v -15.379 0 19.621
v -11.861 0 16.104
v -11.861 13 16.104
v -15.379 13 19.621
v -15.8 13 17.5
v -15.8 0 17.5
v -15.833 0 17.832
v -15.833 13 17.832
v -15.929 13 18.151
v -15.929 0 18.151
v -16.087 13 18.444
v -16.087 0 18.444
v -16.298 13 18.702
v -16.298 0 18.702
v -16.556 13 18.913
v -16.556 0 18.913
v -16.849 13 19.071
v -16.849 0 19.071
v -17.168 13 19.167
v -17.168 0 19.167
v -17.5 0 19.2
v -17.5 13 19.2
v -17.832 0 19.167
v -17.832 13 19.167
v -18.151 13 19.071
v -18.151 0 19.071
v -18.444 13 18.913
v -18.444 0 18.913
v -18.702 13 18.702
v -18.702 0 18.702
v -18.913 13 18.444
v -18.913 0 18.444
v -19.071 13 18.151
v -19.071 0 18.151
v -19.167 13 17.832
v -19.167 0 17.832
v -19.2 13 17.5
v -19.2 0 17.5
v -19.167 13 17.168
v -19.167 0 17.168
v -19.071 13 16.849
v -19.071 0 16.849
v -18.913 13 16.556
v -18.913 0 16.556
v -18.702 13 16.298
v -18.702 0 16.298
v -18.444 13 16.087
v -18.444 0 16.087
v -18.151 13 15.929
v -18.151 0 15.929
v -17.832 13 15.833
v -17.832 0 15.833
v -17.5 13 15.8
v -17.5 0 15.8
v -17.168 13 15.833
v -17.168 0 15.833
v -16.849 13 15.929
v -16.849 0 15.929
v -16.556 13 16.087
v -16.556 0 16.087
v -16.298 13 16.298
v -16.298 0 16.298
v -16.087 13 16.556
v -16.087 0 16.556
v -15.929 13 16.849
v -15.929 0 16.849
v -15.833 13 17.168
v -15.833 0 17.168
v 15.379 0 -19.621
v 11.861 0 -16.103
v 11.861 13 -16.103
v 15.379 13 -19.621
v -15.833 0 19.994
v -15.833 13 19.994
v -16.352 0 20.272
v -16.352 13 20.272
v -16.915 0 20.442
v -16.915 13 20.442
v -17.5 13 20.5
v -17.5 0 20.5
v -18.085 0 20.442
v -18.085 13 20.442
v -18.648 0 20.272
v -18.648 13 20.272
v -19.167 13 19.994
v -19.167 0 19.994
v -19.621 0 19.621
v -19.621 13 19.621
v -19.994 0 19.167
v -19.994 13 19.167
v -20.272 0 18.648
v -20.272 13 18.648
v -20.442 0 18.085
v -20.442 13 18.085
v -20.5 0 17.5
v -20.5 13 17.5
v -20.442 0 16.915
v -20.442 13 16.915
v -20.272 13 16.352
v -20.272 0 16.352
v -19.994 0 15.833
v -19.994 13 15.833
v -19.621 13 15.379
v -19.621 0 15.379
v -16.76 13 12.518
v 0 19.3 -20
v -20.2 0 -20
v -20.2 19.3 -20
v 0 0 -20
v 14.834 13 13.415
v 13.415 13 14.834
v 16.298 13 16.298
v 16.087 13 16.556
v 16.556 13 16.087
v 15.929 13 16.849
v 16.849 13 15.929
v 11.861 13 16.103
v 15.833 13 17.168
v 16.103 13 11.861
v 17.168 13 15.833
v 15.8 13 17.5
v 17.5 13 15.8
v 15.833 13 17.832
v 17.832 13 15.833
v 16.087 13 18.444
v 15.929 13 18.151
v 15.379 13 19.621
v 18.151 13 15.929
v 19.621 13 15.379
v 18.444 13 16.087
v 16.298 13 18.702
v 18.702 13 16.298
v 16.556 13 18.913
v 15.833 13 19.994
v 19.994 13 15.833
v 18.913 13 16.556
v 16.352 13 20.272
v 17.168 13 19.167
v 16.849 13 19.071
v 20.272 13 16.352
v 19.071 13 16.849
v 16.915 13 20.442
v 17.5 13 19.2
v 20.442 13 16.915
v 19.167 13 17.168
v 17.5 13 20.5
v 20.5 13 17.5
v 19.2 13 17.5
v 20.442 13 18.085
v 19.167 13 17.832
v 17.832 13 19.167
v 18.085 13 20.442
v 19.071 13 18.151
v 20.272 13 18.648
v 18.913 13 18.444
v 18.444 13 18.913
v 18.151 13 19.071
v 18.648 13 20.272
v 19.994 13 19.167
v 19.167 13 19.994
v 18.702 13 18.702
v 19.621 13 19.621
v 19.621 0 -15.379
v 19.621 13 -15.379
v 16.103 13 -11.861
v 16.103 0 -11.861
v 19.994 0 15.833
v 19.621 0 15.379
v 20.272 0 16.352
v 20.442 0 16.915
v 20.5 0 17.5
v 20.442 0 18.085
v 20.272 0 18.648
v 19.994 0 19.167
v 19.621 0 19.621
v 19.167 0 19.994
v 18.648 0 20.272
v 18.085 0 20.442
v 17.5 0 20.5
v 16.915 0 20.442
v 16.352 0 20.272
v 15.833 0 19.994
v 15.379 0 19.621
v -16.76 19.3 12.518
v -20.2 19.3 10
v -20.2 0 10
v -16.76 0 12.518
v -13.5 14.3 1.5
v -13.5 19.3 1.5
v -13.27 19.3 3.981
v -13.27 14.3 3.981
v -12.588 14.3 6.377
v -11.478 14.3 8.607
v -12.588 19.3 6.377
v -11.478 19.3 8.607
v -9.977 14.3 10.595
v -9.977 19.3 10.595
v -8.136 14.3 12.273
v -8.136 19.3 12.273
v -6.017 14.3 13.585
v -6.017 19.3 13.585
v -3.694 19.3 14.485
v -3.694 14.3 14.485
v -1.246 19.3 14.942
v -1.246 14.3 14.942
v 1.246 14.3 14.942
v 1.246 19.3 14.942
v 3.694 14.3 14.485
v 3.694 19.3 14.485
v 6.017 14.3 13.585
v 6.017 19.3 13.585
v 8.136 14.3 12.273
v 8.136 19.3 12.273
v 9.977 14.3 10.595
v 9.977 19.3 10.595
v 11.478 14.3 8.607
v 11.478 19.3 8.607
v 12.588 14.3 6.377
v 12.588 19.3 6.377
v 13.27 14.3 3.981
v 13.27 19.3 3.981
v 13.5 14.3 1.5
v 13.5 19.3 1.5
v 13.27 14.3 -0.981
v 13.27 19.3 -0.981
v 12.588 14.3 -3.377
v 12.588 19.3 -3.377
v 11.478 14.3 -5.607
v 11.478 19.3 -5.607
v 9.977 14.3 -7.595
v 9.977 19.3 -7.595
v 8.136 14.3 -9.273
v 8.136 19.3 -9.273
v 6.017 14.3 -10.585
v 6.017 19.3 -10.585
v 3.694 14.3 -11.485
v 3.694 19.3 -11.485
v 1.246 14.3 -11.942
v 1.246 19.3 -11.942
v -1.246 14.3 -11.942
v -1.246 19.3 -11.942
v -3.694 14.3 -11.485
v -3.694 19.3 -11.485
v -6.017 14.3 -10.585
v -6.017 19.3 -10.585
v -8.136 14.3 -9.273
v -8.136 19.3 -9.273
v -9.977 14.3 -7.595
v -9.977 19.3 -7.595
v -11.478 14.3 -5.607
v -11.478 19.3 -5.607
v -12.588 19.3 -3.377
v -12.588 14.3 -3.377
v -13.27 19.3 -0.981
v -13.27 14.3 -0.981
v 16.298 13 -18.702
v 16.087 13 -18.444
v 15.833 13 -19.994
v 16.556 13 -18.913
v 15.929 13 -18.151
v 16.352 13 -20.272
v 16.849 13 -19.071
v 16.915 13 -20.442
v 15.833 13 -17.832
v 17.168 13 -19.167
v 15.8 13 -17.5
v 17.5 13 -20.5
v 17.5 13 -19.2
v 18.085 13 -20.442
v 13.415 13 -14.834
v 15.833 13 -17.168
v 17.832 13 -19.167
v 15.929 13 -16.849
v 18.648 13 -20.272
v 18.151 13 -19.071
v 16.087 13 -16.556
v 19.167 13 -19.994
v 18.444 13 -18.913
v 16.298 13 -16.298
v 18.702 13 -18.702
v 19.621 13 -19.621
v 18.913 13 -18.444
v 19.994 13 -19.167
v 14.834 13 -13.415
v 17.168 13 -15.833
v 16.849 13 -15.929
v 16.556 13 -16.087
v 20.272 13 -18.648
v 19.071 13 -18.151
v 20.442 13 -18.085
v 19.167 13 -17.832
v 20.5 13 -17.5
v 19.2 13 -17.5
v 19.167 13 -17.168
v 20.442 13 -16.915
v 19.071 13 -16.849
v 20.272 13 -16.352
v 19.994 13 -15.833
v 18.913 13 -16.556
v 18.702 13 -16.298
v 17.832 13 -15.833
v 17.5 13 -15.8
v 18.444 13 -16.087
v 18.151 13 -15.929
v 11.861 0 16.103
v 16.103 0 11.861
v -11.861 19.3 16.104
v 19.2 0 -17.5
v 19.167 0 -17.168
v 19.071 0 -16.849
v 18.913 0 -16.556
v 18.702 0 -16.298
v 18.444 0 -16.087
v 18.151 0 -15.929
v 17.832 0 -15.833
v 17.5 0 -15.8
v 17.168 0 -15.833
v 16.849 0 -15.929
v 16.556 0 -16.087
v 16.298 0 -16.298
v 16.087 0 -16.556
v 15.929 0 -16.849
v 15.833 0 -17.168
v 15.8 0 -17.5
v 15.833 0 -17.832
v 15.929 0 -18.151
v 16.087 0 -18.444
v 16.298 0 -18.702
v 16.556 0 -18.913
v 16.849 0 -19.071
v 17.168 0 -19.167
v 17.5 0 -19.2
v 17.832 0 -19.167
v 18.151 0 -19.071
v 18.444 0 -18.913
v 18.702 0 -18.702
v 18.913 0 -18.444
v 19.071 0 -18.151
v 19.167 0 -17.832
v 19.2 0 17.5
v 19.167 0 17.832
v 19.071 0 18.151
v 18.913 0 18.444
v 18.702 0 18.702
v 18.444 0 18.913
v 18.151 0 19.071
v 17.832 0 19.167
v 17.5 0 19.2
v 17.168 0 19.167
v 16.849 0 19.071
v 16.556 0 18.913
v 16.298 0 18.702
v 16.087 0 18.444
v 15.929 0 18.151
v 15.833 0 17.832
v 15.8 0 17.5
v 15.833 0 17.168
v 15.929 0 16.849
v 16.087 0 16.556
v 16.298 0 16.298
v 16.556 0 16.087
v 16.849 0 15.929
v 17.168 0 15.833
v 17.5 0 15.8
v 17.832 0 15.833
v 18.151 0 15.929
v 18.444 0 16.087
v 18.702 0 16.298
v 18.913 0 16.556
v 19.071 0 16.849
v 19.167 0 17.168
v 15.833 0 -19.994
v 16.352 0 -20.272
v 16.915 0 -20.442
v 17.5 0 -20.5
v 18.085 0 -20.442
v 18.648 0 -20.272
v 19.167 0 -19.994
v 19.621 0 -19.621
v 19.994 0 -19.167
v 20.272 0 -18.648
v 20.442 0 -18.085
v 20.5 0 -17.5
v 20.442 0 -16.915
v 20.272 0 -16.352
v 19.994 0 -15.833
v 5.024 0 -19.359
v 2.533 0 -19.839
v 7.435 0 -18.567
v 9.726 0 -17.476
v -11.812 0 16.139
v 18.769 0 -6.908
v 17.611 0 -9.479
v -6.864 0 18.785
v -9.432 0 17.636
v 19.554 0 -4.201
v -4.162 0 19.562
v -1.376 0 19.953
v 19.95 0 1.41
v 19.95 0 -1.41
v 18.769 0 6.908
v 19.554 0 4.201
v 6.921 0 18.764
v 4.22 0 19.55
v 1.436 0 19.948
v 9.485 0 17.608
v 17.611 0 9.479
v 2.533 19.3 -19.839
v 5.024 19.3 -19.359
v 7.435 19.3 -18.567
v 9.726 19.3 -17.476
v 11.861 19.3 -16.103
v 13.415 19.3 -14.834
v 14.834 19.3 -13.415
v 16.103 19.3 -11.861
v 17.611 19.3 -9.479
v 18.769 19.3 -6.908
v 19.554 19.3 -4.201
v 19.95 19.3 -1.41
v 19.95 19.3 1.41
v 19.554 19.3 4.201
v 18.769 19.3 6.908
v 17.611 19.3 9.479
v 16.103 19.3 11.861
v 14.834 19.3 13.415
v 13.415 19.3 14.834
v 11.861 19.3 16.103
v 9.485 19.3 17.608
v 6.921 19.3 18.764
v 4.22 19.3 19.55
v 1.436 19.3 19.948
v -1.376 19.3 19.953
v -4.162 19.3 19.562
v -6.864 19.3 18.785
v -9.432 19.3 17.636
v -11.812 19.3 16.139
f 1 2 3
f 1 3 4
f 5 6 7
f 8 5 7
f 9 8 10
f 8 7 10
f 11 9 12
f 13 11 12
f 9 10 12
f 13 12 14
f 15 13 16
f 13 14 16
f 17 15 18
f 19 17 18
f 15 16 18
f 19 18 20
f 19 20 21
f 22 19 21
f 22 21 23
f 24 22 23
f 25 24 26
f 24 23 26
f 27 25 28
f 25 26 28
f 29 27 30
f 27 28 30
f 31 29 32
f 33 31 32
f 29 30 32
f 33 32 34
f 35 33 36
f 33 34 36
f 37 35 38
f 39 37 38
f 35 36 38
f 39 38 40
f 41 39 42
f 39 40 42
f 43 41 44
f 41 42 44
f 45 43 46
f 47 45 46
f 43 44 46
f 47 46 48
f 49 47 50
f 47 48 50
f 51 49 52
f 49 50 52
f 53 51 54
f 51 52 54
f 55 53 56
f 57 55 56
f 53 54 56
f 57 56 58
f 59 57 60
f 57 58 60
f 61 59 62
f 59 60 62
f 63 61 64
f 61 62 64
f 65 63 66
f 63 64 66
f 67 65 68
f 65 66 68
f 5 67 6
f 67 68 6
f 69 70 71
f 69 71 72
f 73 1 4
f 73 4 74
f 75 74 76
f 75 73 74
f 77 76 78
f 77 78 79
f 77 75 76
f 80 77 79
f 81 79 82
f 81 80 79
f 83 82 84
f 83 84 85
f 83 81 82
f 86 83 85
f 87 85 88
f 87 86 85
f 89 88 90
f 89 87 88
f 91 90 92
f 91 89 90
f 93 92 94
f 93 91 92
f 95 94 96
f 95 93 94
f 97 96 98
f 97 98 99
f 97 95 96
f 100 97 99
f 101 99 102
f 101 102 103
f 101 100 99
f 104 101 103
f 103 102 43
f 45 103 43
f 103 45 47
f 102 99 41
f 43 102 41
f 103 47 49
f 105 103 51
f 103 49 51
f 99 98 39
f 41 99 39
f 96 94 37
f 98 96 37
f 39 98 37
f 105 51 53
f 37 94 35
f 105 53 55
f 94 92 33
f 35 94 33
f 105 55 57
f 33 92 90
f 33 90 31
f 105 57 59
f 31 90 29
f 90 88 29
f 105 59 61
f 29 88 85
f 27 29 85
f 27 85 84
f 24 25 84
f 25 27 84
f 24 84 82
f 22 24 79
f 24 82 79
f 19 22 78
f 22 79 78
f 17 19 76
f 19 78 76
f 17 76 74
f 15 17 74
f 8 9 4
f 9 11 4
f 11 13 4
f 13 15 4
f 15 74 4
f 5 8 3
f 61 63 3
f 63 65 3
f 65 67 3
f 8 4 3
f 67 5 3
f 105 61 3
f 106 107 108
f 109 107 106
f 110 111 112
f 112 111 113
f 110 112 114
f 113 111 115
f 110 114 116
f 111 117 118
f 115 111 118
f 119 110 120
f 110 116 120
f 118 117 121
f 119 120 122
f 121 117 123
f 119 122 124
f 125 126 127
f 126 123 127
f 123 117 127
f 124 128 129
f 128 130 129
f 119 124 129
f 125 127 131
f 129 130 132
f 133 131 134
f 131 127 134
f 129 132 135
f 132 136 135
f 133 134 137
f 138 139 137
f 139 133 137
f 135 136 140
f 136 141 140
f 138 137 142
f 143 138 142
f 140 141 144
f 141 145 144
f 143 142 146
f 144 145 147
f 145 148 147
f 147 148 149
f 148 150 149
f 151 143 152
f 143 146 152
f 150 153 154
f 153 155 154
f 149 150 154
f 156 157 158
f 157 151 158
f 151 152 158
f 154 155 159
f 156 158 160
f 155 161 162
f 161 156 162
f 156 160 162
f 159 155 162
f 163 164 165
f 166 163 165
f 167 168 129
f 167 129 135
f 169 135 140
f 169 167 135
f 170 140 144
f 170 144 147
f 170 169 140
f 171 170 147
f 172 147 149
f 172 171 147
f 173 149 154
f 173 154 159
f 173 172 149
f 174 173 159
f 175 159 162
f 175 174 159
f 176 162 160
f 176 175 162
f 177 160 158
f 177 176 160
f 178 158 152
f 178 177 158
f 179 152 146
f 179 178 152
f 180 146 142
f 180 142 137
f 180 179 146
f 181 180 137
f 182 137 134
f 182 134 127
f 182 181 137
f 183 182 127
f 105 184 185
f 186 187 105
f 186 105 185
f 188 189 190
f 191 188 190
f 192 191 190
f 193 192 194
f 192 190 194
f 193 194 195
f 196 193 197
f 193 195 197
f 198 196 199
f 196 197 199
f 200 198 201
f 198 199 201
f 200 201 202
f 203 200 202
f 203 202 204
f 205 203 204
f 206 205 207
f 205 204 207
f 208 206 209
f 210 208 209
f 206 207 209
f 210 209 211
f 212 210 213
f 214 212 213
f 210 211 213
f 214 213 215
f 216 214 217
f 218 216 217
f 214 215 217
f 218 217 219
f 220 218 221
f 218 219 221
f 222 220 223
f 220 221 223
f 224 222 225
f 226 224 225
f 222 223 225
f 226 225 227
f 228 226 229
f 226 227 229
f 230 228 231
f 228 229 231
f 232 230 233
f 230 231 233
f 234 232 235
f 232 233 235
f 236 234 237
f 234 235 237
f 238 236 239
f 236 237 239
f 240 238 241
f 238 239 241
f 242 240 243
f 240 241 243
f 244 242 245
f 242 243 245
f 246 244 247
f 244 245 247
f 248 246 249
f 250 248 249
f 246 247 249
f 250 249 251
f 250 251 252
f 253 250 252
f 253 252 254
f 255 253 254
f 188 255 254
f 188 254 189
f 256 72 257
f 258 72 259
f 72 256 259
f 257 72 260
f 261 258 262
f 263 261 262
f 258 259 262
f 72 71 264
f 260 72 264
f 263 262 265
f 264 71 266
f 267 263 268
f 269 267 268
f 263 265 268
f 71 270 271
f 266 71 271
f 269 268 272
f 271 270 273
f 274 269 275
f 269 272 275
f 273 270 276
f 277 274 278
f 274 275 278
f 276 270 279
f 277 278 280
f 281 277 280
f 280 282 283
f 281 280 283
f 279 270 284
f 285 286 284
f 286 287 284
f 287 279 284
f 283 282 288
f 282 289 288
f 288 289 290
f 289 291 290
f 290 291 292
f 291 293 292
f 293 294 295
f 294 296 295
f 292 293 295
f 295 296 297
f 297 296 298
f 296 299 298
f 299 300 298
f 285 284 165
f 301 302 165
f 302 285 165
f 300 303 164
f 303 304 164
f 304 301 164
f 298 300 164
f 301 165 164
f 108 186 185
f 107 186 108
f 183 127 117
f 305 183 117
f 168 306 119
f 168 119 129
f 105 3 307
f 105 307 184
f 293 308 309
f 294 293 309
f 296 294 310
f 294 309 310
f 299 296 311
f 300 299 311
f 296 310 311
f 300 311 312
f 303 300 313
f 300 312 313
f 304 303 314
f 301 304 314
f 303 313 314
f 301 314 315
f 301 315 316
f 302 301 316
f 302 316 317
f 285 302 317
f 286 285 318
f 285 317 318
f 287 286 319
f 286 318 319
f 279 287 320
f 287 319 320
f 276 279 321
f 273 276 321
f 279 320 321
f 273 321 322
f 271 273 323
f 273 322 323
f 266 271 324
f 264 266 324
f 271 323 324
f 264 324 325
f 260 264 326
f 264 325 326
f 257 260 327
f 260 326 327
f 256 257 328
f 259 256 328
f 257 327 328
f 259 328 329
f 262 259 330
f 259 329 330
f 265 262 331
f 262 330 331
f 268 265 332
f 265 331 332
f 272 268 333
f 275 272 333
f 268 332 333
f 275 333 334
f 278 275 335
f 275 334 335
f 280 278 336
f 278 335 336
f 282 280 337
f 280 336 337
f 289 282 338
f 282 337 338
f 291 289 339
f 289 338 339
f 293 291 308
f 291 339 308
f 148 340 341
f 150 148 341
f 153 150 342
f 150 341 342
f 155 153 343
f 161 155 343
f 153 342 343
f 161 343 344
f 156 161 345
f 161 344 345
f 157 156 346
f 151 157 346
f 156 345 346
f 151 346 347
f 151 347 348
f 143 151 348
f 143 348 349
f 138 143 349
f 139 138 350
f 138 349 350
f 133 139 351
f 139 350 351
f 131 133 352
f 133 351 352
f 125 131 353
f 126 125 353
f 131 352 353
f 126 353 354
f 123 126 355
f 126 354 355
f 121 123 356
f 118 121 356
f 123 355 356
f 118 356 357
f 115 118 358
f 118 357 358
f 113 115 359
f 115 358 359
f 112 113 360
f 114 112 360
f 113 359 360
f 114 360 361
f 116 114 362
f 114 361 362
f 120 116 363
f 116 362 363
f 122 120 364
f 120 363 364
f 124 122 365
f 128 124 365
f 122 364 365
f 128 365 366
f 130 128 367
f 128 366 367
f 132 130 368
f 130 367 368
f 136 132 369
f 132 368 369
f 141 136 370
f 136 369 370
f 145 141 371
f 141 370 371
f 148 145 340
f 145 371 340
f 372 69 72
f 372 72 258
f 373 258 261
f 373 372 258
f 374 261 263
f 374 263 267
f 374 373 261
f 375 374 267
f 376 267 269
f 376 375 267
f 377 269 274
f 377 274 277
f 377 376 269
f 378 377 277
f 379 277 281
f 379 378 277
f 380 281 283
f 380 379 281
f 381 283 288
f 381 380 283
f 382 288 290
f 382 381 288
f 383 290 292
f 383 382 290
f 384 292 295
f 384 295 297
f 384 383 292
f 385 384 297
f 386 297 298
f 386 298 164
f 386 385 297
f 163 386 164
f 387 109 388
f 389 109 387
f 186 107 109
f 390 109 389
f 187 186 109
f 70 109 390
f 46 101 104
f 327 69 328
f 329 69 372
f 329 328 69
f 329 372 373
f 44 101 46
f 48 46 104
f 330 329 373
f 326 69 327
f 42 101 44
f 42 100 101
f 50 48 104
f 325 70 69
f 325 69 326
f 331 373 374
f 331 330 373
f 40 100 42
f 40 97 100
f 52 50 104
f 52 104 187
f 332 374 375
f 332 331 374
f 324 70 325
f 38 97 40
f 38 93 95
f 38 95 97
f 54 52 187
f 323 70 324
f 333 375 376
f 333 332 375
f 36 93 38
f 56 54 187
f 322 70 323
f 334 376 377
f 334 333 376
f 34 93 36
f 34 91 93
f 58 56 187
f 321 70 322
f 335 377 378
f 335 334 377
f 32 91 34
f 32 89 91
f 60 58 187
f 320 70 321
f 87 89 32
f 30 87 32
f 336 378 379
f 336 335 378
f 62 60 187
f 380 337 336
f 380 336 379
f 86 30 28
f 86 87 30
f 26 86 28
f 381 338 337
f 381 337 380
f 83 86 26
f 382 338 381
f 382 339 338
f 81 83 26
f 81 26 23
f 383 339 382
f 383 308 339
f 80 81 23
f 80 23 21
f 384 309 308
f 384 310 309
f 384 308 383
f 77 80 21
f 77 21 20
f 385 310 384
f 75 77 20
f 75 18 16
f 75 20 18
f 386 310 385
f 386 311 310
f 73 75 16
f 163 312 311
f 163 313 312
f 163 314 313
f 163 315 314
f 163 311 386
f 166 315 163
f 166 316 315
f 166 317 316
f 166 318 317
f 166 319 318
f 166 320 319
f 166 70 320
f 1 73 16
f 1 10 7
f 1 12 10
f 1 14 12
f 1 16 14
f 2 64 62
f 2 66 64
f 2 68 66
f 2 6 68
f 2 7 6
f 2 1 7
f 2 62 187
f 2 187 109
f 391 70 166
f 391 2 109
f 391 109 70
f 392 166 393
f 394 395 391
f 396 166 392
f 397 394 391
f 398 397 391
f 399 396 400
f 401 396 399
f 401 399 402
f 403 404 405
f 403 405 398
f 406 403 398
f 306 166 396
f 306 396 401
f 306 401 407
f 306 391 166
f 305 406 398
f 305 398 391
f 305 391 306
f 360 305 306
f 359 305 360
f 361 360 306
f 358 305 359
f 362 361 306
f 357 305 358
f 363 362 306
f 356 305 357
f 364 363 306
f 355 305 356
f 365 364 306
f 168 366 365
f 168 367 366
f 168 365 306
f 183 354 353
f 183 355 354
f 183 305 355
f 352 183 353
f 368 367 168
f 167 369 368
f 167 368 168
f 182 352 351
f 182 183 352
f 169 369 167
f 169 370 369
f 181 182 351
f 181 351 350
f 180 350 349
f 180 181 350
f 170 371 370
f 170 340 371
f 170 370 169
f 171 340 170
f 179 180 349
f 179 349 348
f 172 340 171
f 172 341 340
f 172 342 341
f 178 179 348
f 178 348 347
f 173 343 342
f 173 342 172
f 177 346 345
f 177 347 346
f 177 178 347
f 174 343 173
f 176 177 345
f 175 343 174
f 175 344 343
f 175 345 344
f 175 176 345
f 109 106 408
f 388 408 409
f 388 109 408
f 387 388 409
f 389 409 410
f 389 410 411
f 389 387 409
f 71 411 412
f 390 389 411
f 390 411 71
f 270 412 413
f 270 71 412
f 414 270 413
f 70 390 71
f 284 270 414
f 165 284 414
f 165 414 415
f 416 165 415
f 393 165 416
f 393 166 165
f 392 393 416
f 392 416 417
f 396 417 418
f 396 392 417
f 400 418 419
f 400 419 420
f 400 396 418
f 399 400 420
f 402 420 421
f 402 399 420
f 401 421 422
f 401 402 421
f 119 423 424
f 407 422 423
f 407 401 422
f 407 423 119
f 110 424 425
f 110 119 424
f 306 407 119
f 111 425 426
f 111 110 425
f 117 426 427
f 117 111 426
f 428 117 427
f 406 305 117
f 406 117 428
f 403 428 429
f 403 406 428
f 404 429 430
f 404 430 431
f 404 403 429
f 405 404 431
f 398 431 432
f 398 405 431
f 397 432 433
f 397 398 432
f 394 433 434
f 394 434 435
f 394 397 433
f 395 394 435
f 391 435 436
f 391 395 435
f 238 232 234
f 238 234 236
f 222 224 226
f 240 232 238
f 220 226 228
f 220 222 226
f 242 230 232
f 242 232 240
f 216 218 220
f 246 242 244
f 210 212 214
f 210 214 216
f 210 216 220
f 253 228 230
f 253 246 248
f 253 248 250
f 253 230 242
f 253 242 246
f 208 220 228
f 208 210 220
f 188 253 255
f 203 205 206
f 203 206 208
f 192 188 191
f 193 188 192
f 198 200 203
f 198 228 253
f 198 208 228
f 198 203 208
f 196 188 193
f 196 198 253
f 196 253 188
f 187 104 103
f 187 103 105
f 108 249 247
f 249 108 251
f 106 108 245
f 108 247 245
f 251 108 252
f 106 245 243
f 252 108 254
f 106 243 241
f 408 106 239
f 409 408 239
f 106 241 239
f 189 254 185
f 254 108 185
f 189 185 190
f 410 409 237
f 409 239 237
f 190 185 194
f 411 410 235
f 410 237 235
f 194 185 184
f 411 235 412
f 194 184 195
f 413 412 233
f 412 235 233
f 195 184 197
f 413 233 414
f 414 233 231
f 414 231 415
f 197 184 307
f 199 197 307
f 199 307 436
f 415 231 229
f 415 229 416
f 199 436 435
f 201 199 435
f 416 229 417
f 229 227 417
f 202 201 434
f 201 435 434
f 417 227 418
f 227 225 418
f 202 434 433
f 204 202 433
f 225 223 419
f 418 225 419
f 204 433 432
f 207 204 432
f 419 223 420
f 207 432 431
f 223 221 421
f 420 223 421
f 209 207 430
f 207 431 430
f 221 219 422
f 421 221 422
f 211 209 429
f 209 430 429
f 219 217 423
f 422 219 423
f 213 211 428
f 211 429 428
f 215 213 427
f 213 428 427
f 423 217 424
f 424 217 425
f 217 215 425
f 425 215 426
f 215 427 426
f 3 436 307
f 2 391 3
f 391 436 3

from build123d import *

# Parameters (mm, degrees)
F0_R     = 1.7
F1_DEPTH = 13
F2_DEPTH = 19.3
F3_R     = 13.5
F4_DEPTH = 5


# Not quite as in the source:
# - ends of sketch curves that miss each other by under 0.0002 mm in the source are joined


with BuildPart() as f1:
    # F0 (on Front) → F1 (new body)
    with BuildSketch(Plane.XZ):
        with BuildLine():
            Line((-20.2, -20), (0, -20))
            ThreePointArc((0, -20), (6.2422337367, -19.0009083461), (11.8608111105, -16.1034517977))
            ThreePointArc((11.8608111105, -16.1034517977), (14.1421356237, -14.1421356237), (16.1034517977, -11.8608111105))
            ThreePointArc((16.1034517977, -11.8608111105), (20, 0), (16.1034517977, 11.8608111105))
            ThreePointArc((16.1034517977, 11.8608111105), (14.1421356237, 14.1421356237), (11.8608111105, 16.1034517977))
            ThreePointArc((11.8608111105, 16.1034517977), (0.0300507716, 19.9999774238), (-11.8123654956, 16.1390216989))
            Line((-11.8123654956, 16.1390216989), (-11.8608644463, 16.1035246693))
            Line((-11.8608644463, 16.1035246693), (-16.7602440212, 12.517603334))
            Line((-16.7602440212, 12.517603334), (-20.2, 10))
            Line((-20.2, 10), (-20.2, -20))
        make_face()
        with BuildLine():
            ThreePointArc((16.1034517977, -11.8608111105), (14.1421356237, -14.1421356237), (11.8608111105, -16.1034517977))
            Line((11.8608111105, -16.1034517977), (15.3786796564, -19.6213203436))
            ThreePointArc((15.3786796564, -19.6213203436), (19.6213203436, -19.6213203436), (19.6213203436, -15.3786796564))
            Line((19.6213203436, -15.3786796564), (16.1034517977, -11.8608111105))
        make_face()
        with Locations((17.5, -17.5)):
            Circle(F0_R, mode=Mode.SUBTRACT)
        with BuildLine():
            ThreePointArc((11.8608111105, 16.1034517977), (14.1421356237, 14.1421356237), (16.1034517977, 11.8608111105))
            Line((16.1034517977, 11.8608111105), (19.6213203436, 15.3786796564))
            ThreePointArc((19.6213203436, 15.3786796564), (19.6213203436, 19.6213203436), (15.3786796564, 19.6213203436))
            Line((15.3786796564, 19.6213203436), (11.8608111105, 16.1034517977))
        make_face()
        with Locations((17.5, 17.5)):
            Circle(F0_R, mode=Mode.SUBTRACT)
        with BuildLine():
            Line((-19.6213203436, 15.3786796564), (-16.7602440212, 12.517603334))
            Line((-16.7602440212, 12.517603334), (-11.8608644463, 16.1035246693))
            Line((-11.8608644463, 16.1035246693), (-15.3786796564, 19.6213203436))
            ThreePointArc((-15.3786796564, 19.6213203436), (-19.6213203436, 19.6213203436), (-19.6213203436, 15.3786796564))
        make_face()
        with Locations((-17.5, 17.5)):
            Circle(F0_R, mode=Mode.SUBTRACT)
    extrude(amount=-F1_DEPTH)

    # F0 (on Front) → F2 (join)
    with BuildSketch(Plane.XZ):
        with BuildLine():
            Line((-20.2, -20), (0, -20))
            ThreePointArc((0, -20), (6.2422337367, -19.0009083461), (11.8608111105, -16.1034517977))
            ThreePointArc((11.8608111105, -16.1034517977), (14.1421356237, -14.1421356237), (16.1034517977, -11.8608111105))
            ThreePointArc((16.1034517977, -11.8608111105), (20, 0), (16.1034517977, 11.8608111105))
            ThreePointArc((16.1034517977, 11.8608111105), (14.1421356237, 14.1421356237), (11.8608111105, 16.1034517977))
            ThreePointArc((11.8608111105, 16.1034517977), (0.0300507716, 19.9999774238), (-11.8123654956, 16.1390216989))
            Line((-11.8123654956, 16.1390216989), (-11.8608644463, 16.1035246693))
            Line((-11.8608644463, 16.1035246693), (-16.7602440212, 12.517603334))
            Line((-16.7602440212, 12.517603334), (-20.2, 10))
            Line((-20.2, 10), (-20.2, -20))
        make_face()
    extrude(amount=-F2_DEPTH)

    # F3 (on face) → F4 (cut)
    with BuildSketch(Plane(origin=(0, 19.3, 0), x_dir=(-1, 0, 0), z_dir=(0, 1, 0))):
        with Locations((0, 1.5)):
            Circle(F3_R)
    extrude(amount=-F4_DEPTH, mode=Mode.SUBTRACT)


solid = f1.part
